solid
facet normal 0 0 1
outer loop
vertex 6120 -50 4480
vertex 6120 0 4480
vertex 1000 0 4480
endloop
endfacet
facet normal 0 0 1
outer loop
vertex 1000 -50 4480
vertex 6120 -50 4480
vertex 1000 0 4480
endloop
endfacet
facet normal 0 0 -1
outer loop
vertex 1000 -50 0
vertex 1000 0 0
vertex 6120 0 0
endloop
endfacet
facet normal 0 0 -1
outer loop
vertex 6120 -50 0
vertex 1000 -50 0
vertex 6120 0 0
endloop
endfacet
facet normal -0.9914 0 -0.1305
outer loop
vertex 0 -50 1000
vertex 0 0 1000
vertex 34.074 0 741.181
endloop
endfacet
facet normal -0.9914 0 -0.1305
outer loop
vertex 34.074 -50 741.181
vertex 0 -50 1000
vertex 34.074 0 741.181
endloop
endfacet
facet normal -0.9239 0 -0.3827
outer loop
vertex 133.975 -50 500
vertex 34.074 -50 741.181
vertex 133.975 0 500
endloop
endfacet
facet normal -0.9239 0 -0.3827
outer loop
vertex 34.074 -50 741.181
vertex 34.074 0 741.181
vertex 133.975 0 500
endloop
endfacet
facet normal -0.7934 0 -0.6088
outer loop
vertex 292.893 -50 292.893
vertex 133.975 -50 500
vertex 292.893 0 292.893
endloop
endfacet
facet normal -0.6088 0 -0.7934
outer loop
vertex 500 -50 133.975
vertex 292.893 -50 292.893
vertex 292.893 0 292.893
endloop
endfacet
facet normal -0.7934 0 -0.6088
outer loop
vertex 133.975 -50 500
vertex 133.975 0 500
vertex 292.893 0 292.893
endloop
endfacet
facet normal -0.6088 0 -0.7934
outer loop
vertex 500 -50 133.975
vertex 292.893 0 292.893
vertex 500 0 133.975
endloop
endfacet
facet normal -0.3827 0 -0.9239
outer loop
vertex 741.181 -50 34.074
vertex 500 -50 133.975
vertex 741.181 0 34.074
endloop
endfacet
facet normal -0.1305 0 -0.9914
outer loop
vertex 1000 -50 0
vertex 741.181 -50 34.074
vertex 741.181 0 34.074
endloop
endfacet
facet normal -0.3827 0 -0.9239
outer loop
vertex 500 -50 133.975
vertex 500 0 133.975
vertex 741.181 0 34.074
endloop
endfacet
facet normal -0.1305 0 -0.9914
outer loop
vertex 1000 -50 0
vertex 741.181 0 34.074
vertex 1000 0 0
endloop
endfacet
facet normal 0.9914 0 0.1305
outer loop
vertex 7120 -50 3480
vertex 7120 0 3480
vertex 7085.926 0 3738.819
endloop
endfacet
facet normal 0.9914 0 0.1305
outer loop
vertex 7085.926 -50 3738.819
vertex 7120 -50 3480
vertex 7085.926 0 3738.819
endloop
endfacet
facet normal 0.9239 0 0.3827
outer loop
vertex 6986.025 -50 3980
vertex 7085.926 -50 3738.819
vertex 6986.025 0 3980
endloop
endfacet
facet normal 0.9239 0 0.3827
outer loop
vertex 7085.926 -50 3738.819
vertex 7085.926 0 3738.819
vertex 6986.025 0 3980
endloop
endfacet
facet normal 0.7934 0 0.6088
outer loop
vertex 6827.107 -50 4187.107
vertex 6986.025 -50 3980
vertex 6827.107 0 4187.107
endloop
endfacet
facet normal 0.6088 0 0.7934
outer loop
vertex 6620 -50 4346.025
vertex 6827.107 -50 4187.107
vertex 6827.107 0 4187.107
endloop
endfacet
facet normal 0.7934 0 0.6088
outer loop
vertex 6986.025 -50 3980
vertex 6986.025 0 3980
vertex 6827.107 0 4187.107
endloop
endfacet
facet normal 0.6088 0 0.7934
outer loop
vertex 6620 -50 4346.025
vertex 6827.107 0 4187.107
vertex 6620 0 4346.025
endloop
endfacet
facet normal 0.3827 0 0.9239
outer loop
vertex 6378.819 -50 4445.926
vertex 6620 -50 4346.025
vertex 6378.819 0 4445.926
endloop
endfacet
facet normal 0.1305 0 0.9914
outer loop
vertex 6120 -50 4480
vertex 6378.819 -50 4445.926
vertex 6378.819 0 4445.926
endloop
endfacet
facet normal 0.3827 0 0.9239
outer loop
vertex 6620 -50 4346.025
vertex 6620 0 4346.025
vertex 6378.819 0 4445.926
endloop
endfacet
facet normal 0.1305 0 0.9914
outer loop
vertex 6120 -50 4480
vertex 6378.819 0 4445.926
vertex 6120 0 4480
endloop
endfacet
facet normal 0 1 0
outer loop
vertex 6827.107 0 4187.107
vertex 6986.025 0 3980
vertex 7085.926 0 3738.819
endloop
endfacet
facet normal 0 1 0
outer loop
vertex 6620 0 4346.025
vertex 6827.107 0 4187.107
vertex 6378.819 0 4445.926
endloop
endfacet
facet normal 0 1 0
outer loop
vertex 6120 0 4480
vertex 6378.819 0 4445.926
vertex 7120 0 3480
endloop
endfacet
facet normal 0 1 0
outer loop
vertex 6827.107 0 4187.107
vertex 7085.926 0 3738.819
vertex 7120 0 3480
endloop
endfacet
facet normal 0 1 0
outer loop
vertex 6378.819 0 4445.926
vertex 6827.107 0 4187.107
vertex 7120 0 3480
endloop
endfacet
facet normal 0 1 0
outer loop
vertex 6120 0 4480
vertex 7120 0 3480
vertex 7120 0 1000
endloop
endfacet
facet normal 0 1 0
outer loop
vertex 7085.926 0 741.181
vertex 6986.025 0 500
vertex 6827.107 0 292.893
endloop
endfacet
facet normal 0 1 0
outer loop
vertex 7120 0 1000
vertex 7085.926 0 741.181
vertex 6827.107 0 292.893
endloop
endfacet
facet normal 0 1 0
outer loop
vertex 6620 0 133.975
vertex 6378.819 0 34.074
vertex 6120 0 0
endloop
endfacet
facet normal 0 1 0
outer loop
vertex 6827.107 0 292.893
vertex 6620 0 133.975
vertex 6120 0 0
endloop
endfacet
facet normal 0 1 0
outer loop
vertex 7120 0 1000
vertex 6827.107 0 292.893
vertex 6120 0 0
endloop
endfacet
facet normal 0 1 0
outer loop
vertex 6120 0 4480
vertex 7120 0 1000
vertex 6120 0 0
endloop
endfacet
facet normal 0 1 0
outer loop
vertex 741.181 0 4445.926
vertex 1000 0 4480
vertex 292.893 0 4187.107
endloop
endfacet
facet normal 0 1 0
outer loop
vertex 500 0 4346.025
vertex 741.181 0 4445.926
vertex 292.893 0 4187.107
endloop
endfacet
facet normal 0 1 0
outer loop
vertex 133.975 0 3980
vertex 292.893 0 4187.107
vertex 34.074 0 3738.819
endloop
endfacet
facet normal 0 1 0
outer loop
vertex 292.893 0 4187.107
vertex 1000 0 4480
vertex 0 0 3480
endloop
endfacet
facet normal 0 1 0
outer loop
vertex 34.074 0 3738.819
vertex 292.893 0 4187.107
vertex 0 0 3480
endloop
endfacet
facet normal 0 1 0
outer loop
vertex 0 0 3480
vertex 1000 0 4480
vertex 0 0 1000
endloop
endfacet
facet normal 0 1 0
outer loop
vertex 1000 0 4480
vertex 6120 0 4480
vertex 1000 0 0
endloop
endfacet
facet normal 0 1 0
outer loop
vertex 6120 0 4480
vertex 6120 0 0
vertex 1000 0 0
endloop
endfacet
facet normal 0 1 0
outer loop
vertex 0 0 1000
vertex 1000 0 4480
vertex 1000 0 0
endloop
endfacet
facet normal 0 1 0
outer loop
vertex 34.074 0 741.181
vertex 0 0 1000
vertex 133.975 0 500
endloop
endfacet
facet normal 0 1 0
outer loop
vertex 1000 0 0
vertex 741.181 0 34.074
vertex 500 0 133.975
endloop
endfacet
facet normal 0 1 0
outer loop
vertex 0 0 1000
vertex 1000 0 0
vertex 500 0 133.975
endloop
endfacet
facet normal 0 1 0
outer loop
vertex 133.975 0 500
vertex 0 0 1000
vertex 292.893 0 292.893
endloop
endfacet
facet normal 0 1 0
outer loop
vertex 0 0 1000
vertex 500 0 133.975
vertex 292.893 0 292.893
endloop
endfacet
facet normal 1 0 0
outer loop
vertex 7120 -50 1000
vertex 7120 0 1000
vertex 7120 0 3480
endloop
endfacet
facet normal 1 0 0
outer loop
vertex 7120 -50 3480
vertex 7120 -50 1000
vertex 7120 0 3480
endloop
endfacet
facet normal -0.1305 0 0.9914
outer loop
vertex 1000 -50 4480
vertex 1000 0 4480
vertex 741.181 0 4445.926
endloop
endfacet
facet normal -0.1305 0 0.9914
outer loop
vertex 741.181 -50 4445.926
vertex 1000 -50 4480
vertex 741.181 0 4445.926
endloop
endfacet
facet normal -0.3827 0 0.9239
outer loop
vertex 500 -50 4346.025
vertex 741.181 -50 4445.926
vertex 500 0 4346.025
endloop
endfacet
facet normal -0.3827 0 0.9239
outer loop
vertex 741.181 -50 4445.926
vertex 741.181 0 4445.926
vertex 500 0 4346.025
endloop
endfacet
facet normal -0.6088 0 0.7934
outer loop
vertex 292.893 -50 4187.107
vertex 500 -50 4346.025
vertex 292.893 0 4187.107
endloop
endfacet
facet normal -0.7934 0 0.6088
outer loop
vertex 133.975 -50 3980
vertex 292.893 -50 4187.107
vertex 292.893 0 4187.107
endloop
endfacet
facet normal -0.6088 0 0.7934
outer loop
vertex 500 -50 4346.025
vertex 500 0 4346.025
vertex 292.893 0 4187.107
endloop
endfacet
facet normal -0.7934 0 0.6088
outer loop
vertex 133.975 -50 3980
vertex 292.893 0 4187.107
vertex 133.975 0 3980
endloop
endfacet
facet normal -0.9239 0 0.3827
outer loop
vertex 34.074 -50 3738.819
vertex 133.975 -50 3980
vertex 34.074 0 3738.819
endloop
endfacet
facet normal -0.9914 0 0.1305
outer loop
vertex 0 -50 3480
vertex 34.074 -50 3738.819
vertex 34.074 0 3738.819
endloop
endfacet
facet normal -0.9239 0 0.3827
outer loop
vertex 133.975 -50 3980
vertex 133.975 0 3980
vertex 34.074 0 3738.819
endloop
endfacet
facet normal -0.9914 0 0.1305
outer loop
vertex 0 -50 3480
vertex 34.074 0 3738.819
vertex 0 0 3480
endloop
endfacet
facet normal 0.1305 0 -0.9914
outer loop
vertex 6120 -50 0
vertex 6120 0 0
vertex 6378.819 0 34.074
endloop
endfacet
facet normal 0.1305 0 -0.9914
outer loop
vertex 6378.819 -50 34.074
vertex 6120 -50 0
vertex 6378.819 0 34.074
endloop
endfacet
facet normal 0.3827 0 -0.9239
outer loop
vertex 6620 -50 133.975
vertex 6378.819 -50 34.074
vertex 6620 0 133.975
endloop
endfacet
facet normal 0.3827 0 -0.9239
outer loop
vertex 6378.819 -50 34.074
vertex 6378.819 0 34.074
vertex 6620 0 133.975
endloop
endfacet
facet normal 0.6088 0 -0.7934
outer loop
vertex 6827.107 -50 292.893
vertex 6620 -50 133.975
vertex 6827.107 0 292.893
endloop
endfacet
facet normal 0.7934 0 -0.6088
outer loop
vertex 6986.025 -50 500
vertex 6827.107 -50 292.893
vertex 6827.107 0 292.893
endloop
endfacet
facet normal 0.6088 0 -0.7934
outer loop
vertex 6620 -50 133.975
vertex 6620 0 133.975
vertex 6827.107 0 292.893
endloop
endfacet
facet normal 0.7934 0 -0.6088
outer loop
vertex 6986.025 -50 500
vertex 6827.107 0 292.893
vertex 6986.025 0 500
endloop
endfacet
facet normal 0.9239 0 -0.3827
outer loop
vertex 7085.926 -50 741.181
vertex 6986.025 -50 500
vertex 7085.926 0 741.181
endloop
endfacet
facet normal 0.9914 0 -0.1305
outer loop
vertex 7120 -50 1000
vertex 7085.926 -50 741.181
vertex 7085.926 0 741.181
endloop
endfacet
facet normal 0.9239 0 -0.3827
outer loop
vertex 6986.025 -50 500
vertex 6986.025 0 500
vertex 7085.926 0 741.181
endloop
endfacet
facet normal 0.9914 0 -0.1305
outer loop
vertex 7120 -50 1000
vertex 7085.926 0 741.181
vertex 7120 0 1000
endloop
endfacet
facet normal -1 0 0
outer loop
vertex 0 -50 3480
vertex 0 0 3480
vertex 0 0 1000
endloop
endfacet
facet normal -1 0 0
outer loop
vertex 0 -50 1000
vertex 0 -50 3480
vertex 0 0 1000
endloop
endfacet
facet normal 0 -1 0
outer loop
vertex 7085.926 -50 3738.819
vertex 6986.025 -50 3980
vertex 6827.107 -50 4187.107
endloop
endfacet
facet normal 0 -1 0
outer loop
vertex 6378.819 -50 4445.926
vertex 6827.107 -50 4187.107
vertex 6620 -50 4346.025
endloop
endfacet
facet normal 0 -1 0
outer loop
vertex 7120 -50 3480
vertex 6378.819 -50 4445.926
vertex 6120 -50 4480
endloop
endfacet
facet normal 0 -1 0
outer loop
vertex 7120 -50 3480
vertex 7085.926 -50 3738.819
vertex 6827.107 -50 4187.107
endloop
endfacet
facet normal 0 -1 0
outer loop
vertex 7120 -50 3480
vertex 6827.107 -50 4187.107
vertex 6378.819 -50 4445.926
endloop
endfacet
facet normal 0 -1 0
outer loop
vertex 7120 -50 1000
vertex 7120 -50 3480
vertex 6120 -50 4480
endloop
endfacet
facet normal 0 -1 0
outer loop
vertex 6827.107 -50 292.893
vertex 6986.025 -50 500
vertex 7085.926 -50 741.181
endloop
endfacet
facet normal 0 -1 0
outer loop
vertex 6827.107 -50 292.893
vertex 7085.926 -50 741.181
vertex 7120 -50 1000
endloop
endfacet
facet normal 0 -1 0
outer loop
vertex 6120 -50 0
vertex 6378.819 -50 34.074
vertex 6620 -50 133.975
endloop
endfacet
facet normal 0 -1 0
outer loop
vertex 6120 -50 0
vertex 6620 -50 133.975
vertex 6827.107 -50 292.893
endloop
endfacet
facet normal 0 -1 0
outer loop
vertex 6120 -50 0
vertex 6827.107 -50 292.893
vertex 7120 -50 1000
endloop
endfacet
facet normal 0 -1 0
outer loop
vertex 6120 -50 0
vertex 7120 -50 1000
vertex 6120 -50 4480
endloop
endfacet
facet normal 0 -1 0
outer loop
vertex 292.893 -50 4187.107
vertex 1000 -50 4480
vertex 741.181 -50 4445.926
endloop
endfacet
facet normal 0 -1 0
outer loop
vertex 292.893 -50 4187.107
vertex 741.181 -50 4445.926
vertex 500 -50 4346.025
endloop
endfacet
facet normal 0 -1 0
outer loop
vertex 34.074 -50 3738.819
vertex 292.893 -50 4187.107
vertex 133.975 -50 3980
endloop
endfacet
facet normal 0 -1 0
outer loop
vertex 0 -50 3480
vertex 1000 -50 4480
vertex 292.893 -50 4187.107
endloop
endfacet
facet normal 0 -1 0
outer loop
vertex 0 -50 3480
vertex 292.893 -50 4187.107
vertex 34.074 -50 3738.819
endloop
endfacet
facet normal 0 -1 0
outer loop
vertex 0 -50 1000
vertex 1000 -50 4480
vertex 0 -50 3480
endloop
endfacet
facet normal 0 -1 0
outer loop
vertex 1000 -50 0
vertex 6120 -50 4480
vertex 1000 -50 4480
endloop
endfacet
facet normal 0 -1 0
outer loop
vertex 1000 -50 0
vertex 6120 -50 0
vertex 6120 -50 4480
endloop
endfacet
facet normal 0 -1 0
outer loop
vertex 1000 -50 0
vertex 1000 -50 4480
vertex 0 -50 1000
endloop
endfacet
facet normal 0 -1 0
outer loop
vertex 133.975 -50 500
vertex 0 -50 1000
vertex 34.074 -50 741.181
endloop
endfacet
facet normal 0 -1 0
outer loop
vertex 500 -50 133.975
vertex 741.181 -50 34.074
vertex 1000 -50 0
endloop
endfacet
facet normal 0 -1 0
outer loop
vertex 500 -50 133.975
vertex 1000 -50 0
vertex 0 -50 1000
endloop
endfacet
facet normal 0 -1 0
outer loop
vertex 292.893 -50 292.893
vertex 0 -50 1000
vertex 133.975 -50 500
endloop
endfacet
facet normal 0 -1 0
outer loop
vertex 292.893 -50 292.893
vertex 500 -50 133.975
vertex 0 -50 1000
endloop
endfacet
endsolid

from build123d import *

# Parameters (mm, degrees)
DODANIE_WYCI_GNI_CIE1_DEPTH = 50


with BuildPart() as part:
    # Szkic1 → Dodanie-wyciągnięcie1 (new body)
    with BuildSketch(Plane(origin=(0, 0, 0), x_dir=(1, 0, 0), z_dir=(0, 1, 0))):
        with BuildLine():
            Line((1000, 0), (6120, 0))
            ThreePointArc((6120, 0), (6827.106781187, -292.893218813), (7120, -1000))
            Line((7120, -1000), (7120, -3480))
            ThreePointArc((7120, -3480), (6827.106781187, -4187.106781187), (6120, -4480))
            Line((6120, -4480), (1000, -4480))
            ThreePointArc((1000, -4480), (292.893218813, -4187.106781187), (0, -3480))
            Line((0, -3480), (0, -1000))
            ThreePointArc((0, -1000), (292.893218813, -292.893218813), (1000, 0))
        make_face()
    extrude(amount=-DODANIE_WYCI_GNI_CIE1_DEPTH)


solid = part.part
